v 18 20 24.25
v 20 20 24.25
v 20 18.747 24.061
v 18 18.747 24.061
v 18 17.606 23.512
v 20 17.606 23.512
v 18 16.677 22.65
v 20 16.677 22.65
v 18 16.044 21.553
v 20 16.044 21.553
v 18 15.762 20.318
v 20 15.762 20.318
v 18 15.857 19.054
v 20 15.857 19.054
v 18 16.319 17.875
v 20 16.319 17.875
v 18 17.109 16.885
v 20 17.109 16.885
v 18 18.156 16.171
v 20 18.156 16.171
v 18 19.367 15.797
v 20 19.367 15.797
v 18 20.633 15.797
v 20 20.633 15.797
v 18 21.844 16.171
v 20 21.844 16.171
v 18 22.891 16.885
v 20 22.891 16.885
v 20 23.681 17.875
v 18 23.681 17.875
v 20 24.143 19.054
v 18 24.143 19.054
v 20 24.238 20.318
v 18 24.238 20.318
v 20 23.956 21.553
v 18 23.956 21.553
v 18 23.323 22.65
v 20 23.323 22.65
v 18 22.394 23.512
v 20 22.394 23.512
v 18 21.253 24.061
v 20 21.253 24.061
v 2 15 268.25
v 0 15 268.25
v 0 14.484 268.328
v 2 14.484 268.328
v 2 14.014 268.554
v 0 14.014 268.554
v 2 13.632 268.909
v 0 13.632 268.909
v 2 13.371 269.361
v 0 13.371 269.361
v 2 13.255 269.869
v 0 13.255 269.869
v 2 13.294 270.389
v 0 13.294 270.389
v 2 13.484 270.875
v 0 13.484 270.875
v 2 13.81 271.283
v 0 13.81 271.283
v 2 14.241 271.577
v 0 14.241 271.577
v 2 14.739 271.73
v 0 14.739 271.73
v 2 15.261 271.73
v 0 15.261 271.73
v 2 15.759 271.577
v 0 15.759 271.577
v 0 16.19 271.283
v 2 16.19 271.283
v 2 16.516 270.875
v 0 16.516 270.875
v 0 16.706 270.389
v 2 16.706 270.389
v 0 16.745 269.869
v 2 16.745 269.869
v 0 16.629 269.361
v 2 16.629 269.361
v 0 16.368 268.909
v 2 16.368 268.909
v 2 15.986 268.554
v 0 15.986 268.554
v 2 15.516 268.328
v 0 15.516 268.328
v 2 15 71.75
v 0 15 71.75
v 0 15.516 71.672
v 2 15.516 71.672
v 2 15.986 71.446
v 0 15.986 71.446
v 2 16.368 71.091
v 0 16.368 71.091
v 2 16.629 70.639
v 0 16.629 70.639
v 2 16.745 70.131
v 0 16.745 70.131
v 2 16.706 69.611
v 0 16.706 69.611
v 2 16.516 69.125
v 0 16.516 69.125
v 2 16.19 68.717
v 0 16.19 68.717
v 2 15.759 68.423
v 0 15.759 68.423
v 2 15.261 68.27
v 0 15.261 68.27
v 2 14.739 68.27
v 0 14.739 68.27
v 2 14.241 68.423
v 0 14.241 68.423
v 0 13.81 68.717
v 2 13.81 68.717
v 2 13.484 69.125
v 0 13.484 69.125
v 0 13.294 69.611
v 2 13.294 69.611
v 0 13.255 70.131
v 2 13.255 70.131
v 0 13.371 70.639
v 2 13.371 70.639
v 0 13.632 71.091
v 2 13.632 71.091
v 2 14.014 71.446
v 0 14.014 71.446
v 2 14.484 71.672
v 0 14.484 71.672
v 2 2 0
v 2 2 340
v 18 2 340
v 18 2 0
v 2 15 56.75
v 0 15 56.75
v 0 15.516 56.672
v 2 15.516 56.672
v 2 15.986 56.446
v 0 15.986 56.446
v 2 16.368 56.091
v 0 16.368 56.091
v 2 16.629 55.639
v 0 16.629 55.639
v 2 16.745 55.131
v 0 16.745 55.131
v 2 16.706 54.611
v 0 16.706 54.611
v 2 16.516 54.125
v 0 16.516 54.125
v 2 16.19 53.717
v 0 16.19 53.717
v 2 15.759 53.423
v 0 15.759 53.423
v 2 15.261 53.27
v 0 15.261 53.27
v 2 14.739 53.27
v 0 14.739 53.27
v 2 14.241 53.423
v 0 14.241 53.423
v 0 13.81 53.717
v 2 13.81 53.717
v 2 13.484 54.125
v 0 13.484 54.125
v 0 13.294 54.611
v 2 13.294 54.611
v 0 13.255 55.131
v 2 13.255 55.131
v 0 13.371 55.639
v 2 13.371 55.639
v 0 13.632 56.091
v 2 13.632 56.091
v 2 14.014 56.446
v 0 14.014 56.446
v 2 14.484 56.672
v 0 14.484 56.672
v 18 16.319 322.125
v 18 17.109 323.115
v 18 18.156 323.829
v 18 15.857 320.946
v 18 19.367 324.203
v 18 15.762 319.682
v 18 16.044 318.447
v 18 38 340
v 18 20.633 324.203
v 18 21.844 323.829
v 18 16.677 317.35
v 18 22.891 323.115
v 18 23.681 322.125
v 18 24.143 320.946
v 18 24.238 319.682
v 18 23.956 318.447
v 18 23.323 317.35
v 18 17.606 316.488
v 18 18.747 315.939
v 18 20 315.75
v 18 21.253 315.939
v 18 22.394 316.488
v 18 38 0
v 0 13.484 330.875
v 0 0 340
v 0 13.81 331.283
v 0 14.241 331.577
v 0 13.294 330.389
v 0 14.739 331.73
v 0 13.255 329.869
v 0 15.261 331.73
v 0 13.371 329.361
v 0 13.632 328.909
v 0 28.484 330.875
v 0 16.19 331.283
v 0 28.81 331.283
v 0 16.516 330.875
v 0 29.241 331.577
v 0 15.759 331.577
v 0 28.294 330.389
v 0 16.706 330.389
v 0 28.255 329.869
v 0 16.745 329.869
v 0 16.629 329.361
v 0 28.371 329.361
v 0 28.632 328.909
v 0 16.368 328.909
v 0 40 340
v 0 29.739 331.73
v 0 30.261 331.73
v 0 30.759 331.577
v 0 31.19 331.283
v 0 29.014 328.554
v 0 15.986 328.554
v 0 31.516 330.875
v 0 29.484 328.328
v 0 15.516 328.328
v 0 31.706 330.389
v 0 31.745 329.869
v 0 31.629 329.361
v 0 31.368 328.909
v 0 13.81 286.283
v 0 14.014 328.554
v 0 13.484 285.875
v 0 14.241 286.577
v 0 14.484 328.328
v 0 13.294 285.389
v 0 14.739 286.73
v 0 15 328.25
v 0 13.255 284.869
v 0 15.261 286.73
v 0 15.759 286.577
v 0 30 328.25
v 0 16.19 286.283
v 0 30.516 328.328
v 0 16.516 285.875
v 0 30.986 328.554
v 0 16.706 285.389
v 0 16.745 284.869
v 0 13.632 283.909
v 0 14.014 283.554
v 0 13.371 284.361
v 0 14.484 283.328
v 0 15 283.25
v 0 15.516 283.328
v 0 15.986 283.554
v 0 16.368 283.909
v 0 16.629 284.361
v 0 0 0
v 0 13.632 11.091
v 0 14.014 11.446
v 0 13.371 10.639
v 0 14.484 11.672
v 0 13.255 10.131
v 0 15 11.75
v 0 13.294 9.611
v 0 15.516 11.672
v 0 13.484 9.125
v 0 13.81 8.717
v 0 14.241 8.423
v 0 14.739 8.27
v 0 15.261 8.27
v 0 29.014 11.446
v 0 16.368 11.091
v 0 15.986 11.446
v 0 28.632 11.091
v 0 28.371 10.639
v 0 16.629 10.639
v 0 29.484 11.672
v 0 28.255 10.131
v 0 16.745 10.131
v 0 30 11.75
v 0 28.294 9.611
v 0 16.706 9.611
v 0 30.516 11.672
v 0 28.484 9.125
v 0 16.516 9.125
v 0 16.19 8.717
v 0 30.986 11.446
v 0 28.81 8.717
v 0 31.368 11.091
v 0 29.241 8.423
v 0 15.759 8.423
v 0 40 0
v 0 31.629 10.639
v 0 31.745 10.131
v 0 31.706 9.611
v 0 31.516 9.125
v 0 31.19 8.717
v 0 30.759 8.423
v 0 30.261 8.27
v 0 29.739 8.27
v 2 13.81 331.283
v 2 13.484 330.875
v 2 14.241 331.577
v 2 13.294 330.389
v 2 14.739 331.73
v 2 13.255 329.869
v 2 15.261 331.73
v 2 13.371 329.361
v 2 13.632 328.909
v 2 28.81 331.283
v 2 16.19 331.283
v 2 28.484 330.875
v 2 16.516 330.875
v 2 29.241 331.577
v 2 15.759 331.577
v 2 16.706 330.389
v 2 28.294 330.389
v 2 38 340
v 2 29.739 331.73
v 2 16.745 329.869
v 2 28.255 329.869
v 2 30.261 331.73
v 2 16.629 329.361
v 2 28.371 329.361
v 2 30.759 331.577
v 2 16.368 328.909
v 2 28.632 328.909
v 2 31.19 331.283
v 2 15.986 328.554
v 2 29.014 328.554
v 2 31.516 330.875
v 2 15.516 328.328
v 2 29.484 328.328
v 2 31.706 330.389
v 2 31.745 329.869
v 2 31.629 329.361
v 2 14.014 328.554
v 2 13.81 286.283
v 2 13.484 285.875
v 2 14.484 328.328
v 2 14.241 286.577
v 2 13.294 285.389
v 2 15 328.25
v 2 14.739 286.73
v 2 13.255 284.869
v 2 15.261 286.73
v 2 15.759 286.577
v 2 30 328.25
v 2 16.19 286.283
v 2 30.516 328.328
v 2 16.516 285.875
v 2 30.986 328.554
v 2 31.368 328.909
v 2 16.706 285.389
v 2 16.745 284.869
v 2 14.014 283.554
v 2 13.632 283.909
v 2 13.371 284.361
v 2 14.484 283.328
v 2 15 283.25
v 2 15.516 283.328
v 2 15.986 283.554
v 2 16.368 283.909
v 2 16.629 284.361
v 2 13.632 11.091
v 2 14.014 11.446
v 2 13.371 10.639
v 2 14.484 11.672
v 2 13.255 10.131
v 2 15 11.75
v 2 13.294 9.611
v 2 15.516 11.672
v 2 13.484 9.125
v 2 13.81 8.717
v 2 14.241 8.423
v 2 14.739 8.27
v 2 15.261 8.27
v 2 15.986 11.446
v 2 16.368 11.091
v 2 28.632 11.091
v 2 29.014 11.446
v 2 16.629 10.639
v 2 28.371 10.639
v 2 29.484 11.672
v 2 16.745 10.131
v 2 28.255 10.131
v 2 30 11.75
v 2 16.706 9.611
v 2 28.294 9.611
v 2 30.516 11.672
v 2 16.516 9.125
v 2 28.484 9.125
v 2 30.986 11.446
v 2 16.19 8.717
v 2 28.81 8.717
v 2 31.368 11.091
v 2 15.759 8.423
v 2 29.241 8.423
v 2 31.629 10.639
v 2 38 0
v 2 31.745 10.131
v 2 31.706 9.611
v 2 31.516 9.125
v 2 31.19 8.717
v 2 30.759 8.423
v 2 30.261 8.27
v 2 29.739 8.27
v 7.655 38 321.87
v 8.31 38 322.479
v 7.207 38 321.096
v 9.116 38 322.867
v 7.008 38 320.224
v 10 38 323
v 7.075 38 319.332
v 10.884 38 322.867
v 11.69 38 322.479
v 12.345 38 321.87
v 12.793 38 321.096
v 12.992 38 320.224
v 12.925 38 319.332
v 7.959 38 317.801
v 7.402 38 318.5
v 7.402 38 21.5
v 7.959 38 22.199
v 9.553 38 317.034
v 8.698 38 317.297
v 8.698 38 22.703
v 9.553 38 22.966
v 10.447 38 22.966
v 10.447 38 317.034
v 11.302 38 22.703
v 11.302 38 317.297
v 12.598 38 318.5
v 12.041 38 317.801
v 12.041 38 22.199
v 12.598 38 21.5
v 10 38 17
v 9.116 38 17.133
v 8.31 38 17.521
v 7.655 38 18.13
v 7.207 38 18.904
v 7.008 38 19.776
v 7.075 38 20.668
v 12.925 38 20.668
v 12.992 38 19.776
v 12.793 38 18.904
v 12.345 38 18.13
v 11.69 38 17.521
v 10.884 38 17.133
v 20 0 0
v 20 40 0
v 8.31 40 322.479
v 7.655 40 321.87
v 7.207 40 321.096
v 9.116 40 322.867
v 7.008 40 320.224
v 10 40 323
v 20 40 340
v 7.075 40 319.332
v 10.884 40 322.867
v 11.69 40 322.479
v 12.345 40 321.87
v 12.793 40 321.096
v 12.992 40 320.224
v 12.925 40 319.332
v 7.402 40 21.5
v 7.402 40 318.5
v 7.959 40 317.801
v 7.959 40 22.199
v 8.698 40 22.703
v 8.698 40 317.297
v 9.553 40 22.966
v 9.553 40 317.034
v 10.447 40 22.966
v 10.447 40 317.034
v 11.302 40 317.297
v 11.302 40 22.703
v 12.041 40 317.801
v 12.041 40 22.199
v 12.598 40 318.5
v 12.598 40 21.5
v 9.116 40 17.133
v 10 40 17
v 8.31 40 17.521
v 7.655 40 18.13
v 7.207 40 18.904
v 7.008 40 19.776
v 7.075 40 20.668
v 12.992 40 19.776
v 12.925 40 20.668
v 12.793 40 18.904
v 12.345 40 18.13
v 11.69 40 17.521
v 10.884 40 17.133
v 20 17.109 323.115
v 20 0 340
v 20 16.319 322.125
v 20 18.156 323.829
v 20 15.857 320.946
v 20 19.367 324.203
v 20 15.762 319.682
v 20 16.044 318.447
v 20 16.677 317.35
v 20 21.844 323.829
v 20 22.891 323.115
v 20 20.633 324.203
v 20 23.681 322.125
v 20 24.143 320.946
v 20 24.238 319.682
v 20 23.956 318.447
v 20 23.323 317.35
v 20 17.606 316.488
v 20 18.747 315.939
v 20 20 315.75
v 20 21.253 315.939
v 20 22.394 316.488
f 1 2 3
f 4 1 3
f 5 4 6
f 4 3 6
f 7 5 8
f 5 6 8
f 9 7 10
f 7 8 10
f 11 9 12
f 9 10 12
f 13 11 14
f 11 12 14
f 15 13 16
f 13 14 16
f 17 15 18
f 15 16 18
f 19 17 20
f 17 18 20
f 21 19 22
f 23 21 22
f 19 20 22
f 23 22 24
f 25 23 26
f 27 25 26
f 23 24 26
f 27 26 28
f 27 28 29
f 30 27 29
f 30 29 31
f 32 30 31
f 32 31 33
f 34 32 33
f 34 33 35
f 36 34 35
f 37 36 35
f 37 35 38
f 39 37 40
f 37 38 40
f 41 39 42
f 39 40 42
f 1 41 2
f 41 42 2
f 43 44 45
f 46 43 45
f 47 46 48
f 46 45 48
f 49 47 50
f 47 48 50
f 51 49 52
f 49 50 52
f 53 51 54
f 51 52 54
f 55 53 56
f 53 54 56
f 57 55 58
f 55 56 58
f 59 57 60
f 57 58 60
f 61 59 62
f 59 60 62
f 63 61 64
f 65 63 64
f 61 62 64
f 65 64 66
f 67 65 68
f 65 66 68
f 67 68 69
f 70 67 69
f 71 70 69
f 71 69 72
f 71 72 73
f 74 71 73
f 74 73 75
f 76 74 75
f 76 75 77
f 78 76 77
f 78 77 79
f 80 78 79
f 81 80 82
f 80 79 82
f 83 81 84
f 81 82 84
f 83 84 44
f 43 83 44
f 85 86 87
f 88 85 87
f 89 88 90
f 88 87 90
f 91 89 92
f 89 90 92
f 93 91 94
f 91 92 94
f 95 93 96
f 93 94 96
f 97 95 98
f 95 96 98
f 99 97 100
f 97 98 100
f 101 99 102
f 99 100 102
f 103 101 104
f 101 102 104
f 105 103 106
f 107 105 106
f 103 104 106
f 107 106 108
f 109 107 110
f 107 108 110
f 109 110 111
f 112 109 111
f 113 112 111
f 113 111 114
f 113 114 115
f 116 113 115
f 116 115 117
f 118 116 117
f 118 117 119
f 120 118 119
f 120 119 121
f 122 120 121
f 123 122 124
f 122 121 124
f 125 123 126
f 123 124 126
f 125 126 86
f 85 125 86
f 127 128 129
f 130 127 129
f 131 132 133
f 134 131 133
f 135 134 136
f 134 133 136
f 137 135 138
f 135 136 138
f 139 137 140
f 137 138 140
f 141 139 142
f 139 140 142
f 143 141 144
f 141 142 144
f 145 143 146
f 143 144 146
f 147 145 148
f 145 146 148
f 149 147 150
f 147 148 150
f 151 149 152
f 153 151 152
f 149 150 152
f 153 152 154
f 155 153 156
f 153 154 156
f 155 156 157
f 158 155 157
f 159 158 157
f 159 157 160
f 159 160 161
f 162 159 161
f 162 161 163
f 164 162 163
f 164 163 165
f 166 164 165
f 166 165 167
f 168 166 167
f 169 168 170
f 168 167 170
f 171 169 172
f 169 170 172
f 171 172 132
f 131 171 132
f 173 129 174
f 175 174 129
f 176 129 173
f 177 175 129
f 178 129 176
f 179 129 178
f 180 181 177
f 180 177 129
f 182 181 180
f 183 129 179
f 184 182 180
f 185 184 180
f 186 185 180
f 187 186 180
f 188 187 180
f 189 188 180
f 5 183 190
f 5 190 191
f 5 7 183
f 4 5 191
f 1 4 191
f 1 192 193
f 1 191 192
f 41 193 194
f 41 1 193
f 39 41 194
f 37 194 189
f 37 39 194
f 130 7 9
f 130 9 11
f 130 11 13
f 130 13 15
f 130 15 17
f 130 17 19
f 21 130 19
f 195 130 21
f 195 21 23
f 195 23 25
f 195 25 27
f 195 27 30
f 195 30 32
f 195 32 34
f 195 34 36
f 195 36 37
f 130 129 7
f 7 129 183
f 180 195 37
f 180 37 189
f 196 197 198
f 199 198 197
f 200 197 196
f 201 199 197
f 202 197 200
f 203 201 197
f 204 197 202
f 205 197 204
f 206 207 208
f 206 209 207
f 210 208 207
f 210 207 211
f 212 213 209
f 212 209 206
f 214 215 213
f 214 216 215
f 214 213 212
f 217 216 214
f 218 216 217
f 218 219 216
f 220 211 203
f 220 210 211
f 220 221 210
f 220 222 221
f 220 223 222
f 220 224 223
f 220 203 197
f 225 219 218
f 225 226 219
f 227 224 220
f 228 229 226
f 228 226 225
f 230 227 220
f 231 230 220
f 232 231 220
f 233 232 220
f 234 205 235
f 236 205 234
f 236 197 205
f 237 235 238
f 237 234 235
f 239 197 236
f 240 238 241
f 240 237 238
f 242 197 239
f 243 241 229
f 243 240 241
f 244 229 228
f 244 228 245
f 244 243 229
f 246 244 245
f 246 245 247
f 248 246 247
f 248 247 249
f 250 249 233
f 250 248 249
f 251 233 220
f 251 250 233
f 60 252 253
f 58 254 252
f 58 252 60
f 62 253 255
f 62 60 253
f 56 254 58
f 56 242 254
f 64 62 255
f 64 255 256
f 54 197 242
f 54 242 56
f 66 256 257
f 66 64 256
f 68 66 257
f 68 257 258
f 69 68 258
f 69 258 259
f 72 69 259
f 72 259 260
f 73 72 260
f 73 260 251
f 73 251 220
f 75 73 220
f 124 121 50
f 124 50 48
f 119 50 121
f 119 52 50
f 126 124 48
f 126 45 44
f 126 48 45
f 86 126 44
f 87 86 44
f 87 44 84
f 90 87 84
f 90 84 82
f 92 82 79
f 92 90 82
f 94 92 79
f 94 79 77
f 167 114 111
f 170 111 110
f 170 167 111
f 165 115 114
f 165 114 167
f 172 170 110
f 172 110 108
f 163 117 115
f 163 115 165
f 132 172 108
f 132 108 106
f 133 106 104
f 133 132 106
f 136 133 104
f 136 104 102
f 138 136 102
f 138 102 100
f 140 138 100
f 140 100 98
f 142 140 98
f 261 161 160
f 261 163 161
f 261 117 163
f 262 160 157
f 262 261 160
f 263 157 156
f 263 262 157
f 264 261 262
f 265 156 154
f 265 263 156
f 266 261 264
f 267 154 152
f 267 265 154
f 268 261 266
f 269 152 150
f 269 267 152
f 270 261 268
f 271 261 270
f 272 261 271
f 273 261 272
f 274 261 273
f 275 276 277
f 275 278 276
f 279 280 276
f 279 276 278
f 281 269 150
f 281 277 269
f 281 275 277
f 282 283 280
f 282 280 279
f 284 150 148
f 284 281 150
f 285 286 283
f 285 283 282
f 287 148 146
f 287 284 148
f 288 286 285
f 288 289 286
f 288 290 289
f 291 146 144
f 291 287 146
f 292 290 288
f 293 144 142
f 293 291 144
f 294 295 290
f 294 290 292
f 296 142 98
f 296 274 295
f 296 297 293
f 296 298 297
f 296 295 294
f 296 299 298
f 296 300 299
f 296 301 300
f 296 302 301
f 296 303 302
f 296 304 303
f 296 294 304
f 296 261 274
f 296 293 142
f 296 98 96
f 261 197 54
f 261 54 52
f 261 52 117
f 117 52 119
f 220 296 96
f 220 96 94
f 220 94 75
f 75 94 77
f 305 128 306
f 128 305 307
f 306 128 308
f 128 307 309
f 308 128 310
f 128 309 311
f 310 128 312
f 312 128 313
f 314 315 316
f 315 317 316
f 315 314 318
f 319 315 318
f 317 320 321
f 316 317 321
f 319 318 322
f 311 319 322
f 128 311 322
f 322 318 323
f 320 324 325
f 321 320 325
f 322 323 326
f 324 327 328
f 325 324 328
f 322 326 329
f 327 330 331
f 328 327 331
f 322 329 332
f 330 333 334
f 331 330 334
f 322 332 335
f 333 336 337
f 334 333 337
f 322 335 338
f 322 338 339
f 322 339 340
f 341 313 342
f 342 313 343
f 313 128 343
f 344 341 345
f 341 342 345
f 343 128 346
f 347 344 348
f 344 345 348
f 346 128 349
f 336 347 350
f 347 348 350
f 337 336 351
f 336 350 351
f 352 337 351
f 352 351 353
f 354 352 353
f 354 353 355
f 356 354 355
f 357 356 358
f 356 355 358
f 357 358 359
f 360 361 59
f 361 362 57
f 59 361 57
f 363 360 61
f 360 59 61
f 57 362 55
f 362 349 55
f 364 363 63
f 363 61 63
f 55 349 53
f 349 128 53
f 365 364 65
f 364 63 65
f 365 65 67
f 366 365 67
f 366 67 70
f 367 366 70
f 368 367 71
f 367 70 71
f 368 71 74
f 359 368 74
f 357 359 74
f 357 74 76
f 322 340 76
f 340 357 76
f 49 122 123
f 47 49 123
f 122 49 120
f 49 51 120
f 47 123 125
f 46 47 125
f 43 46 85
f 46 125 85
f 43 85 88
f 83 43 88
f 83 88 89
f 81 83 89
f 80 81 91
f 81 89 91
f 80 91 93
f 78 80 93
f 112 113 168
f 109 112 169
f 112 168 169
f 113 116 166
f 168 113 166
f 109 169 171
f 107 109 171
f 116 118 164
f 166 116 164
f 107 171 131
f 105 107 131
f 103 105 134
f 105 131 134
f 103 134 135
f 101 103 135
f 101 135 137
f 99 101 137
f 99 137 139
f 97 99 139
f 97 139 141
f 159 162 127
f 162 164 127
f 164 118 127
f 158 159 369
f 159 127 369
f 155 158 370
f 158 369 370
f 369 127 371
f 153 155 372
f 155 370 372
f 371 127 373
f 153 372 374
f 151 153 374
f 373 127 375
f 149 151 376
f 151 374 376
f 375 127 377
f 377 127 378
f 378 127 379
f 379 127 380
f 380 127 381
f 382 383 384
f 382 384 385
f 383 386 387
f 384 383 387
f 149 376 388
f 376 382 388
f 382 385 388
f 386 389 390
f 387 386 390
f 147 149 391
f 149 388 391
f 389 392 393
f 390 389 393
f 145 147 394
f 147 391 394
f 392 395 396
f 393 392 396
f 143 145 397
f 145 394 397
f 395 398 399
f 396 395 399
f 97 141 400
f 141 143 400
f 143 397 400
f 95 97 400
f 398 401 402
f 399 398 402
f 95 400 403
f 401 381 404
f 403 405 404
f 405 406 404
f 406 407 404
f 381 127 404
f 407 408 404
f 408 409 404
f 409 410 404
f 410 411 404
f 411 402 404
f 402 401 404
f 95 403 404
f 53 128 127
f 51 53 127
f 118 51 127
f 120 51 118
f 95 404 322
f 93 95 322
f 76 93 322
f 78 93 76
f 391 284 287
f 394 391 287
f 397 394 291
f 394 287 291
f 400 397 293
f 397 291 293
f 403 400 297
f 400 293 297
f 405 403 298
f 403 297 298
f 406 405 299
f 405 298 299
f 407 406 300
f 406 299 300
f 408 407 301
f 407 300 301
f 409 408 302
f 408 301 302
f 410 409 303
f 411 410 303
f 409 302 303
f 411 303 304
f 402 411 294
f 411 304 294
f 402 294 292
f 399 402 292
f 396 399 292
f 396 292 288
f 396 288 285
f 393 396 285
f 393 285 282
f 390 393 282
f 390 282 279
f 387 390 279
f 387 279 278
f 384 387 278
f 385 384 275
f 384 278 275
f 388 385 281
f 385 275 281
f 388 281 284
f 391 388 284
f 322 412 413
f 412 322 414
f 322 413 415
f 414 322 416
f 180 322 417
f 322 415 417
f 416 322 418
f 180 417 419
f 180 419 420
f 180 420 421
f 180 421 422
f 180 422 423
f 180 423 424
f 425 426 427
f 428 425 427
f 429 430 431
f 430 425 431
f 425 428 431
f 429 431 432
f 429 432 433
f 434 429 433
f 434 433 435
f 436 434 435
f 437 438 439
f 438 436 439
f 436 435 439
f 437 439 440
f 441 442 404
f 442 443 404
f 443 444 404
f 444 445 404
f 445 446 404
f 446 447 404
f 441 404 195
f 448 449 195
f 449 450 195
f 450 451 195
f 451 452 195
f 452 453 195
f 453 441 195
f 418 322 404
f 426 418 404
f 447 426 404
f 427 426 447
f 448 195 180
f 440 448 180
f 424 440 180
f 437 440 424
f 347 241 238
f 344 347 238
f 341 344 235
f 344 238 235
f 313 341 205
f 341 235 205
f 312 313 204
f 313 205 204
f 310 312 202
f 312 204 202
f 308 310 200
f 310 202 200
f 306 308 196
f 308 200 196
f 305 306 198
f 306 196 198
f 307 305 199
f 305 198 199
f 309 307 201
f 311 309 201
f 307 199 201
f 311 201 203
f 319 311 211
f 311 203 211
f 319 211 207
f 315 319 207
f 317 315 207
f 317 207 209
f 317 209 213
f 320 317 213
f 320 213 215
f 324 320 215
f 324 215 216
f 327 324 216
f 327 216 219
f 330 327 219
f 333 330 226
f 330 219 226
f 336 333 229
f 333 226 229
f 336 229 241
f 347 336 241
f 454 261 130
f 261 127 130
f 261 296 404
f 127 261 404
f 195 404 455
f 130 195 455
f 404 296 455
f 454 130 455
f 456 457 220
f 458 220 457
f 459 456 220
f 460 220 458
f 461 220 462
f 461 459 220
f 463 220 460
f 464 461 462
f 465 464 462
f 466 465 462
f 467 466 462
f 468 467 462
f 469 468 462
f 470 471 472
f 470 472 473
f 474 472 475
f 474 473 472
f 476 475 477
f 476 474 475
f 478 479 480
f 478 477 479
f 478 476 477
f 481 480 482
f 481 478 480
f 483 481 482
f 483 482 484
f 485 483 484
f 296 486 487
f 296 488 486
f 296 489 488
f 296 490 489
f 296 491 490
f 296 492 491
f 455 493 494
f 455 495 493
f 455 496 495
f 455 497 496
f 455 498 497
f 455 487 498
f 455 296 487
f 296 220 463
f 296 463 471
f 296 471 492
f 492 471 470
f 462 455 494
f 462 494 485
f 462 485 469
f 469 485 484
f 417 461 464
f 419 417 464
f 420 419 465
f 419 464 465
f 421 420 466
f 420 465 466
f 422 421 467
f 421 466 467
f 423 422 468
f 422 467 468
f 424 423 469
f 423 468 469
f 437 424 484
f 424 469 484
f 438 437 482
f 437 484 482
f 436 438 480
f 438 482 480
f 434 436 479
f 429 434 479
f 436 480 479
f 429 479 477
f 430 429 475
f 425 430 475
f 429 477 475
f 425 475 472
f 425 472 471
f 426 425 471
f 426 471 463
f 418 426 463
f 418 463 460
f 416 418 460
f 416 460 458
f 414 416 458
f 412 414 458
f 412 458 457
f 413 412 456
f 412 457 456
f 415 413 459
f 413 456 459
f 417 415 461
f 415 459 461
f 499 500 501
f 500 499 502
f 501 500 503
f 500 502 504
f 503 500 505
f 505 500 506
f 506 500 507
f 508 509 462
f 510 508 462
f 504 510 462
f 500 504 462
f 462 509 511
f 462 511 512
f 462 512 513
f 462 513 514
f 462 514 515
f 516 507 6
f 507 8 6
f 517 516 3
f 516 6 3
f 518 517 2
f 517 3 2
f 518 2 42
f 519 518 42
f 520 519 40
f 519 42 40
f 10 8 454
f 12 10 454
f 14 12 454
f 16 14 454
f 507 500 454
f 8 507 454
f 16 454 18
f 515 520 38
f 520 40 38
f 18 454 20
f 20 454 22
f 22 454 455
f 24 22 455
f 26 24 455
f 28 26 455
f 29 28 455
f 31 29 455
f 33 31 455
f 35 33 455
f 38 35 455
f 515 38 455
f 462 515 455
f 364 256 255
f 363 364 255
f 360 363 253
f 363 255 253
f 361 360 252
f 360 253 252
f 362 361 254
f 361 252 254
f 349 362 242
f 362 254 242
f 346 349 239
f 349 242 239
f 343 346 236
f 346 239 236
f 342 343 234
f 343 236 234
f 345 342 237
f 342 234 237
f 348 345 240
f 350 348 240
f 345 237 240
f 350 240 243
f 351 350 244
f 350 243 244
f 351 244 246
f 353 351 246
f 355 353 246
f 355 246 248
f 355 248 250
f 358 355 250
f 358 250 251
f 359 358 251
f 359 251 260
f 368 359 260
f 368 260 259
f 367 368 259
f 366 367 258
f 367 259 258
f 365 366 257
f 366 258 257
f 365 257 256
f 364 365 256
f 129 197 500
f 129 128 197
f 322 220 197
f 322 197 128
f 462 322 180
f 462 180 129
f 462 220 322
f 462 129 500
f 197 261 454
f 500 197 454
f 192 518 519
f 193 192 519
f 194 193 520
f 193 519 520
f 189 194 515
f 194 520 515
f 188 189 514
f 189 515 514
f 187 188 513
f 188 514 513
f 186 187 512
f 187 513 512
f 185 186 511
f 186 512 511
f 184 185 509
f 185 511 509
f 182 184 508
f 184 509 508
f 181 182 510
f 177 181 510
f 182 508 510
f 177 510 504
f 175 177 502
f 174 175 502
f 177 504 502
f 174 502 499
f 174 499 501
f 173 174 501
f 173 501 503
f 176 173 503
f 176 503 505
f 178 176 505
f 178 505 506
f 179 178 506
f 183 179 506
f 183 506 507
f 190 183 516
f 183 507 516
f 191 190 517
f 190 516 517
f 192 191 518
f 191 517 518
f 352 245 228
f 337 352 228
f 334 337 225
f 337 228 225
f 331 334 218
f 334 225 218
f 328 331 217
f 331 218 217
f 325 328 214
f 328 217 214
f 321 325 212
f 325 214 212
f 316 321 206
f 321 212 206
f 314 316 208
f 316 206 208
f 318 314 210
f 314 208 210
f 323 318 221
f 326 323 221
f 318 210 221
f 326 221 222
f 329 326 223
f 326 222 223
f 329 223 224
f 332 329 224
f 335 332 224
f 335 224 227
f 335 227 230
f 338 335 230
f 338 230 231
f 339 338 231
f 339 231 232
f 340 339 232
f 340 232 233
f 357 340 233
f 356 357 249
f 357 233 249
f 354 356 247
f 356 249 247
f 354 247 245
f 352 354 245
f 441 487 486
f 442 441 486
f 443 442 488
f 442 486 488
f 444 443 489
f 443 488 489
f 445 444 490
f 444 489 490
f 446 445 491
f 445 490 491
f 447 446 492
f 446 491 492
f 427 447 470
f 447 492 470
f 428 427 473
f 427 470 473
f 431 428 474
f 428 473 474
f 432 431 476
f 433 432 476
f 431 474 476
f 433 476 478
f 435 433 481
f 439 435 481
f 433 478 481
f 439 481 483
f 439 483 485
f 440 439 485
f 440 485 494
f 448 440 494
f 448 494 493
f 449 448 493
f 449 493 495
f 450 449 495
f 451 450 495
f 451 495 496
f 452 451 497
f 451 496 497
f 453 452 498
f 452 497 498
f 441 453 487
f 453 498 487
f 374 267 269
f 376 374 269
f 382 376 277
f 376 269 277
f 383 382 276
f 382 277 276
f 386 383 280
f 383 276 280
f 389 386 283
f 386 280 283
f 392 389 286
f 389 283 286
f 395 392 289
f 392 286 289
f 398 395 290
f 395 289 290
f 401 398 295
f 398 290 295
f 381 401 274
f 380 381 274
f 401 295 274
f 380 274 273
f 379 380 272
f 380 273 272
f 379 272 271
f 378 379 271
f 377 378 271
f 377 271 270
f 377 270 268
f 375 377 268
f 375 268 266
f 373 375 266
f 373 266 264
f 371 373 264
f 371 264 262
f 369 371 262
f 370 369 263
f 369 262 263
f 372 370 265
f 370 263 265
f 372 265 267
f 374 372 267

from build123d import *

# Parameters (mm, degrees)
ESBO_O1_W                = 20
ESBO_O1_H                = 40
ESBO_O1_W_2              = 16
ESBO_O1_H_2              = 36
RESSALTO_EXTRUS_O1_DEPTH = 340
ESBO_O2_R                = 1.75
CORTE_EXTRUS_O1_DEPTH    = 2
ESBO_O3_R                = 3
CORTE_EXTRUS_O2_DEPTH    = 2
ESBO_O4_R                = 4.25
CORTE_EXTRUS_O3_DEPTH    = 2


with BuildPart() as part:
    # Esboço1 → Ressalto-extrusão1 (new body)
    with BuildSketch(Plane.XY):
        with Locations((10, 20)):
            Rectangle(ESBO_O1_W, ESBO_O1_H)
        with Locations((10, 20)):
            Rectangle(ESBO_O1_W_2, ESBO_O1_H_2, mode=Mode.SUBTRACT)
    extrude(amount=RESSALTO_EXTRUS_O1_DEPTH)

    # Esboço2 → Corte-extrusão1 (cut)
    with BuildSketch(Plane.ZY):
        with Locations((10, 30)):
            Circle(ESBO_O2_R)
        with Locations((10, 15)):
            Circle(ESBO_O2_R)
        with Locations((70, 15)):
            Circle(ESBO_O2_R)
        with Locations((55, 15)):
            Circle(ESBO_O2_R)
        with Locations(Location((270, 15, 0), (0, 0, 180))):
            Circle(ESBO_O2_R)
        with Locations(Location((285, 15, 0), (0, 0, 180))):
            Circle(ESBO_O2_R)
        with Locations(Location((330, 15, 0), (0, 0, 180))):
            Circle(ESBO_O2_R)
        with Locations(Location((330, 30, 0), (0, 0, 180))):
            Circle(ESBO_O2_R)
    extrude(amount=-CORTE_EXTRUS_O1_DEPTH, mode=Mode.SUBTRACT)

    # Esboço3 → Corte-extrusão2 (cut)
    with BuildSketch(Plane(origin=(0, 40, 0), x_dir=(1, 0, 0), z_dir=(0, 1, 0))):
        with Locations(Location((10, -320, 0), (0, 0, 270))):
            Circle(ESBO_O3_R)
        with Locations(Location((10, -20, 0), (0, 0, 90))):
            Circle(ESBO_O3_R)
    extrude(amount=-CORTE_EXTRUS_O2_DEPTH, mode=Mode.SUBTRACT)

    # Esboço4 → Corte-extrusão3 (cut)
    with BuildSketch(Plane(origin=(20, 0, 0), x_dir=(0, 0, -1), z_dir=(1, 0, 0))):
        with Locations((-320, 20)):
            Circle(ESBO_O4_R)
        with Locations(Location((-20, 20, 0), (0, 0, 180))):
            Circle(ESBO_O4_R)
    extrude(amount=-CORTE_EXTRUS_O3_DEPTH, mode=Mode.SUBTRACT)


solid = part.part
